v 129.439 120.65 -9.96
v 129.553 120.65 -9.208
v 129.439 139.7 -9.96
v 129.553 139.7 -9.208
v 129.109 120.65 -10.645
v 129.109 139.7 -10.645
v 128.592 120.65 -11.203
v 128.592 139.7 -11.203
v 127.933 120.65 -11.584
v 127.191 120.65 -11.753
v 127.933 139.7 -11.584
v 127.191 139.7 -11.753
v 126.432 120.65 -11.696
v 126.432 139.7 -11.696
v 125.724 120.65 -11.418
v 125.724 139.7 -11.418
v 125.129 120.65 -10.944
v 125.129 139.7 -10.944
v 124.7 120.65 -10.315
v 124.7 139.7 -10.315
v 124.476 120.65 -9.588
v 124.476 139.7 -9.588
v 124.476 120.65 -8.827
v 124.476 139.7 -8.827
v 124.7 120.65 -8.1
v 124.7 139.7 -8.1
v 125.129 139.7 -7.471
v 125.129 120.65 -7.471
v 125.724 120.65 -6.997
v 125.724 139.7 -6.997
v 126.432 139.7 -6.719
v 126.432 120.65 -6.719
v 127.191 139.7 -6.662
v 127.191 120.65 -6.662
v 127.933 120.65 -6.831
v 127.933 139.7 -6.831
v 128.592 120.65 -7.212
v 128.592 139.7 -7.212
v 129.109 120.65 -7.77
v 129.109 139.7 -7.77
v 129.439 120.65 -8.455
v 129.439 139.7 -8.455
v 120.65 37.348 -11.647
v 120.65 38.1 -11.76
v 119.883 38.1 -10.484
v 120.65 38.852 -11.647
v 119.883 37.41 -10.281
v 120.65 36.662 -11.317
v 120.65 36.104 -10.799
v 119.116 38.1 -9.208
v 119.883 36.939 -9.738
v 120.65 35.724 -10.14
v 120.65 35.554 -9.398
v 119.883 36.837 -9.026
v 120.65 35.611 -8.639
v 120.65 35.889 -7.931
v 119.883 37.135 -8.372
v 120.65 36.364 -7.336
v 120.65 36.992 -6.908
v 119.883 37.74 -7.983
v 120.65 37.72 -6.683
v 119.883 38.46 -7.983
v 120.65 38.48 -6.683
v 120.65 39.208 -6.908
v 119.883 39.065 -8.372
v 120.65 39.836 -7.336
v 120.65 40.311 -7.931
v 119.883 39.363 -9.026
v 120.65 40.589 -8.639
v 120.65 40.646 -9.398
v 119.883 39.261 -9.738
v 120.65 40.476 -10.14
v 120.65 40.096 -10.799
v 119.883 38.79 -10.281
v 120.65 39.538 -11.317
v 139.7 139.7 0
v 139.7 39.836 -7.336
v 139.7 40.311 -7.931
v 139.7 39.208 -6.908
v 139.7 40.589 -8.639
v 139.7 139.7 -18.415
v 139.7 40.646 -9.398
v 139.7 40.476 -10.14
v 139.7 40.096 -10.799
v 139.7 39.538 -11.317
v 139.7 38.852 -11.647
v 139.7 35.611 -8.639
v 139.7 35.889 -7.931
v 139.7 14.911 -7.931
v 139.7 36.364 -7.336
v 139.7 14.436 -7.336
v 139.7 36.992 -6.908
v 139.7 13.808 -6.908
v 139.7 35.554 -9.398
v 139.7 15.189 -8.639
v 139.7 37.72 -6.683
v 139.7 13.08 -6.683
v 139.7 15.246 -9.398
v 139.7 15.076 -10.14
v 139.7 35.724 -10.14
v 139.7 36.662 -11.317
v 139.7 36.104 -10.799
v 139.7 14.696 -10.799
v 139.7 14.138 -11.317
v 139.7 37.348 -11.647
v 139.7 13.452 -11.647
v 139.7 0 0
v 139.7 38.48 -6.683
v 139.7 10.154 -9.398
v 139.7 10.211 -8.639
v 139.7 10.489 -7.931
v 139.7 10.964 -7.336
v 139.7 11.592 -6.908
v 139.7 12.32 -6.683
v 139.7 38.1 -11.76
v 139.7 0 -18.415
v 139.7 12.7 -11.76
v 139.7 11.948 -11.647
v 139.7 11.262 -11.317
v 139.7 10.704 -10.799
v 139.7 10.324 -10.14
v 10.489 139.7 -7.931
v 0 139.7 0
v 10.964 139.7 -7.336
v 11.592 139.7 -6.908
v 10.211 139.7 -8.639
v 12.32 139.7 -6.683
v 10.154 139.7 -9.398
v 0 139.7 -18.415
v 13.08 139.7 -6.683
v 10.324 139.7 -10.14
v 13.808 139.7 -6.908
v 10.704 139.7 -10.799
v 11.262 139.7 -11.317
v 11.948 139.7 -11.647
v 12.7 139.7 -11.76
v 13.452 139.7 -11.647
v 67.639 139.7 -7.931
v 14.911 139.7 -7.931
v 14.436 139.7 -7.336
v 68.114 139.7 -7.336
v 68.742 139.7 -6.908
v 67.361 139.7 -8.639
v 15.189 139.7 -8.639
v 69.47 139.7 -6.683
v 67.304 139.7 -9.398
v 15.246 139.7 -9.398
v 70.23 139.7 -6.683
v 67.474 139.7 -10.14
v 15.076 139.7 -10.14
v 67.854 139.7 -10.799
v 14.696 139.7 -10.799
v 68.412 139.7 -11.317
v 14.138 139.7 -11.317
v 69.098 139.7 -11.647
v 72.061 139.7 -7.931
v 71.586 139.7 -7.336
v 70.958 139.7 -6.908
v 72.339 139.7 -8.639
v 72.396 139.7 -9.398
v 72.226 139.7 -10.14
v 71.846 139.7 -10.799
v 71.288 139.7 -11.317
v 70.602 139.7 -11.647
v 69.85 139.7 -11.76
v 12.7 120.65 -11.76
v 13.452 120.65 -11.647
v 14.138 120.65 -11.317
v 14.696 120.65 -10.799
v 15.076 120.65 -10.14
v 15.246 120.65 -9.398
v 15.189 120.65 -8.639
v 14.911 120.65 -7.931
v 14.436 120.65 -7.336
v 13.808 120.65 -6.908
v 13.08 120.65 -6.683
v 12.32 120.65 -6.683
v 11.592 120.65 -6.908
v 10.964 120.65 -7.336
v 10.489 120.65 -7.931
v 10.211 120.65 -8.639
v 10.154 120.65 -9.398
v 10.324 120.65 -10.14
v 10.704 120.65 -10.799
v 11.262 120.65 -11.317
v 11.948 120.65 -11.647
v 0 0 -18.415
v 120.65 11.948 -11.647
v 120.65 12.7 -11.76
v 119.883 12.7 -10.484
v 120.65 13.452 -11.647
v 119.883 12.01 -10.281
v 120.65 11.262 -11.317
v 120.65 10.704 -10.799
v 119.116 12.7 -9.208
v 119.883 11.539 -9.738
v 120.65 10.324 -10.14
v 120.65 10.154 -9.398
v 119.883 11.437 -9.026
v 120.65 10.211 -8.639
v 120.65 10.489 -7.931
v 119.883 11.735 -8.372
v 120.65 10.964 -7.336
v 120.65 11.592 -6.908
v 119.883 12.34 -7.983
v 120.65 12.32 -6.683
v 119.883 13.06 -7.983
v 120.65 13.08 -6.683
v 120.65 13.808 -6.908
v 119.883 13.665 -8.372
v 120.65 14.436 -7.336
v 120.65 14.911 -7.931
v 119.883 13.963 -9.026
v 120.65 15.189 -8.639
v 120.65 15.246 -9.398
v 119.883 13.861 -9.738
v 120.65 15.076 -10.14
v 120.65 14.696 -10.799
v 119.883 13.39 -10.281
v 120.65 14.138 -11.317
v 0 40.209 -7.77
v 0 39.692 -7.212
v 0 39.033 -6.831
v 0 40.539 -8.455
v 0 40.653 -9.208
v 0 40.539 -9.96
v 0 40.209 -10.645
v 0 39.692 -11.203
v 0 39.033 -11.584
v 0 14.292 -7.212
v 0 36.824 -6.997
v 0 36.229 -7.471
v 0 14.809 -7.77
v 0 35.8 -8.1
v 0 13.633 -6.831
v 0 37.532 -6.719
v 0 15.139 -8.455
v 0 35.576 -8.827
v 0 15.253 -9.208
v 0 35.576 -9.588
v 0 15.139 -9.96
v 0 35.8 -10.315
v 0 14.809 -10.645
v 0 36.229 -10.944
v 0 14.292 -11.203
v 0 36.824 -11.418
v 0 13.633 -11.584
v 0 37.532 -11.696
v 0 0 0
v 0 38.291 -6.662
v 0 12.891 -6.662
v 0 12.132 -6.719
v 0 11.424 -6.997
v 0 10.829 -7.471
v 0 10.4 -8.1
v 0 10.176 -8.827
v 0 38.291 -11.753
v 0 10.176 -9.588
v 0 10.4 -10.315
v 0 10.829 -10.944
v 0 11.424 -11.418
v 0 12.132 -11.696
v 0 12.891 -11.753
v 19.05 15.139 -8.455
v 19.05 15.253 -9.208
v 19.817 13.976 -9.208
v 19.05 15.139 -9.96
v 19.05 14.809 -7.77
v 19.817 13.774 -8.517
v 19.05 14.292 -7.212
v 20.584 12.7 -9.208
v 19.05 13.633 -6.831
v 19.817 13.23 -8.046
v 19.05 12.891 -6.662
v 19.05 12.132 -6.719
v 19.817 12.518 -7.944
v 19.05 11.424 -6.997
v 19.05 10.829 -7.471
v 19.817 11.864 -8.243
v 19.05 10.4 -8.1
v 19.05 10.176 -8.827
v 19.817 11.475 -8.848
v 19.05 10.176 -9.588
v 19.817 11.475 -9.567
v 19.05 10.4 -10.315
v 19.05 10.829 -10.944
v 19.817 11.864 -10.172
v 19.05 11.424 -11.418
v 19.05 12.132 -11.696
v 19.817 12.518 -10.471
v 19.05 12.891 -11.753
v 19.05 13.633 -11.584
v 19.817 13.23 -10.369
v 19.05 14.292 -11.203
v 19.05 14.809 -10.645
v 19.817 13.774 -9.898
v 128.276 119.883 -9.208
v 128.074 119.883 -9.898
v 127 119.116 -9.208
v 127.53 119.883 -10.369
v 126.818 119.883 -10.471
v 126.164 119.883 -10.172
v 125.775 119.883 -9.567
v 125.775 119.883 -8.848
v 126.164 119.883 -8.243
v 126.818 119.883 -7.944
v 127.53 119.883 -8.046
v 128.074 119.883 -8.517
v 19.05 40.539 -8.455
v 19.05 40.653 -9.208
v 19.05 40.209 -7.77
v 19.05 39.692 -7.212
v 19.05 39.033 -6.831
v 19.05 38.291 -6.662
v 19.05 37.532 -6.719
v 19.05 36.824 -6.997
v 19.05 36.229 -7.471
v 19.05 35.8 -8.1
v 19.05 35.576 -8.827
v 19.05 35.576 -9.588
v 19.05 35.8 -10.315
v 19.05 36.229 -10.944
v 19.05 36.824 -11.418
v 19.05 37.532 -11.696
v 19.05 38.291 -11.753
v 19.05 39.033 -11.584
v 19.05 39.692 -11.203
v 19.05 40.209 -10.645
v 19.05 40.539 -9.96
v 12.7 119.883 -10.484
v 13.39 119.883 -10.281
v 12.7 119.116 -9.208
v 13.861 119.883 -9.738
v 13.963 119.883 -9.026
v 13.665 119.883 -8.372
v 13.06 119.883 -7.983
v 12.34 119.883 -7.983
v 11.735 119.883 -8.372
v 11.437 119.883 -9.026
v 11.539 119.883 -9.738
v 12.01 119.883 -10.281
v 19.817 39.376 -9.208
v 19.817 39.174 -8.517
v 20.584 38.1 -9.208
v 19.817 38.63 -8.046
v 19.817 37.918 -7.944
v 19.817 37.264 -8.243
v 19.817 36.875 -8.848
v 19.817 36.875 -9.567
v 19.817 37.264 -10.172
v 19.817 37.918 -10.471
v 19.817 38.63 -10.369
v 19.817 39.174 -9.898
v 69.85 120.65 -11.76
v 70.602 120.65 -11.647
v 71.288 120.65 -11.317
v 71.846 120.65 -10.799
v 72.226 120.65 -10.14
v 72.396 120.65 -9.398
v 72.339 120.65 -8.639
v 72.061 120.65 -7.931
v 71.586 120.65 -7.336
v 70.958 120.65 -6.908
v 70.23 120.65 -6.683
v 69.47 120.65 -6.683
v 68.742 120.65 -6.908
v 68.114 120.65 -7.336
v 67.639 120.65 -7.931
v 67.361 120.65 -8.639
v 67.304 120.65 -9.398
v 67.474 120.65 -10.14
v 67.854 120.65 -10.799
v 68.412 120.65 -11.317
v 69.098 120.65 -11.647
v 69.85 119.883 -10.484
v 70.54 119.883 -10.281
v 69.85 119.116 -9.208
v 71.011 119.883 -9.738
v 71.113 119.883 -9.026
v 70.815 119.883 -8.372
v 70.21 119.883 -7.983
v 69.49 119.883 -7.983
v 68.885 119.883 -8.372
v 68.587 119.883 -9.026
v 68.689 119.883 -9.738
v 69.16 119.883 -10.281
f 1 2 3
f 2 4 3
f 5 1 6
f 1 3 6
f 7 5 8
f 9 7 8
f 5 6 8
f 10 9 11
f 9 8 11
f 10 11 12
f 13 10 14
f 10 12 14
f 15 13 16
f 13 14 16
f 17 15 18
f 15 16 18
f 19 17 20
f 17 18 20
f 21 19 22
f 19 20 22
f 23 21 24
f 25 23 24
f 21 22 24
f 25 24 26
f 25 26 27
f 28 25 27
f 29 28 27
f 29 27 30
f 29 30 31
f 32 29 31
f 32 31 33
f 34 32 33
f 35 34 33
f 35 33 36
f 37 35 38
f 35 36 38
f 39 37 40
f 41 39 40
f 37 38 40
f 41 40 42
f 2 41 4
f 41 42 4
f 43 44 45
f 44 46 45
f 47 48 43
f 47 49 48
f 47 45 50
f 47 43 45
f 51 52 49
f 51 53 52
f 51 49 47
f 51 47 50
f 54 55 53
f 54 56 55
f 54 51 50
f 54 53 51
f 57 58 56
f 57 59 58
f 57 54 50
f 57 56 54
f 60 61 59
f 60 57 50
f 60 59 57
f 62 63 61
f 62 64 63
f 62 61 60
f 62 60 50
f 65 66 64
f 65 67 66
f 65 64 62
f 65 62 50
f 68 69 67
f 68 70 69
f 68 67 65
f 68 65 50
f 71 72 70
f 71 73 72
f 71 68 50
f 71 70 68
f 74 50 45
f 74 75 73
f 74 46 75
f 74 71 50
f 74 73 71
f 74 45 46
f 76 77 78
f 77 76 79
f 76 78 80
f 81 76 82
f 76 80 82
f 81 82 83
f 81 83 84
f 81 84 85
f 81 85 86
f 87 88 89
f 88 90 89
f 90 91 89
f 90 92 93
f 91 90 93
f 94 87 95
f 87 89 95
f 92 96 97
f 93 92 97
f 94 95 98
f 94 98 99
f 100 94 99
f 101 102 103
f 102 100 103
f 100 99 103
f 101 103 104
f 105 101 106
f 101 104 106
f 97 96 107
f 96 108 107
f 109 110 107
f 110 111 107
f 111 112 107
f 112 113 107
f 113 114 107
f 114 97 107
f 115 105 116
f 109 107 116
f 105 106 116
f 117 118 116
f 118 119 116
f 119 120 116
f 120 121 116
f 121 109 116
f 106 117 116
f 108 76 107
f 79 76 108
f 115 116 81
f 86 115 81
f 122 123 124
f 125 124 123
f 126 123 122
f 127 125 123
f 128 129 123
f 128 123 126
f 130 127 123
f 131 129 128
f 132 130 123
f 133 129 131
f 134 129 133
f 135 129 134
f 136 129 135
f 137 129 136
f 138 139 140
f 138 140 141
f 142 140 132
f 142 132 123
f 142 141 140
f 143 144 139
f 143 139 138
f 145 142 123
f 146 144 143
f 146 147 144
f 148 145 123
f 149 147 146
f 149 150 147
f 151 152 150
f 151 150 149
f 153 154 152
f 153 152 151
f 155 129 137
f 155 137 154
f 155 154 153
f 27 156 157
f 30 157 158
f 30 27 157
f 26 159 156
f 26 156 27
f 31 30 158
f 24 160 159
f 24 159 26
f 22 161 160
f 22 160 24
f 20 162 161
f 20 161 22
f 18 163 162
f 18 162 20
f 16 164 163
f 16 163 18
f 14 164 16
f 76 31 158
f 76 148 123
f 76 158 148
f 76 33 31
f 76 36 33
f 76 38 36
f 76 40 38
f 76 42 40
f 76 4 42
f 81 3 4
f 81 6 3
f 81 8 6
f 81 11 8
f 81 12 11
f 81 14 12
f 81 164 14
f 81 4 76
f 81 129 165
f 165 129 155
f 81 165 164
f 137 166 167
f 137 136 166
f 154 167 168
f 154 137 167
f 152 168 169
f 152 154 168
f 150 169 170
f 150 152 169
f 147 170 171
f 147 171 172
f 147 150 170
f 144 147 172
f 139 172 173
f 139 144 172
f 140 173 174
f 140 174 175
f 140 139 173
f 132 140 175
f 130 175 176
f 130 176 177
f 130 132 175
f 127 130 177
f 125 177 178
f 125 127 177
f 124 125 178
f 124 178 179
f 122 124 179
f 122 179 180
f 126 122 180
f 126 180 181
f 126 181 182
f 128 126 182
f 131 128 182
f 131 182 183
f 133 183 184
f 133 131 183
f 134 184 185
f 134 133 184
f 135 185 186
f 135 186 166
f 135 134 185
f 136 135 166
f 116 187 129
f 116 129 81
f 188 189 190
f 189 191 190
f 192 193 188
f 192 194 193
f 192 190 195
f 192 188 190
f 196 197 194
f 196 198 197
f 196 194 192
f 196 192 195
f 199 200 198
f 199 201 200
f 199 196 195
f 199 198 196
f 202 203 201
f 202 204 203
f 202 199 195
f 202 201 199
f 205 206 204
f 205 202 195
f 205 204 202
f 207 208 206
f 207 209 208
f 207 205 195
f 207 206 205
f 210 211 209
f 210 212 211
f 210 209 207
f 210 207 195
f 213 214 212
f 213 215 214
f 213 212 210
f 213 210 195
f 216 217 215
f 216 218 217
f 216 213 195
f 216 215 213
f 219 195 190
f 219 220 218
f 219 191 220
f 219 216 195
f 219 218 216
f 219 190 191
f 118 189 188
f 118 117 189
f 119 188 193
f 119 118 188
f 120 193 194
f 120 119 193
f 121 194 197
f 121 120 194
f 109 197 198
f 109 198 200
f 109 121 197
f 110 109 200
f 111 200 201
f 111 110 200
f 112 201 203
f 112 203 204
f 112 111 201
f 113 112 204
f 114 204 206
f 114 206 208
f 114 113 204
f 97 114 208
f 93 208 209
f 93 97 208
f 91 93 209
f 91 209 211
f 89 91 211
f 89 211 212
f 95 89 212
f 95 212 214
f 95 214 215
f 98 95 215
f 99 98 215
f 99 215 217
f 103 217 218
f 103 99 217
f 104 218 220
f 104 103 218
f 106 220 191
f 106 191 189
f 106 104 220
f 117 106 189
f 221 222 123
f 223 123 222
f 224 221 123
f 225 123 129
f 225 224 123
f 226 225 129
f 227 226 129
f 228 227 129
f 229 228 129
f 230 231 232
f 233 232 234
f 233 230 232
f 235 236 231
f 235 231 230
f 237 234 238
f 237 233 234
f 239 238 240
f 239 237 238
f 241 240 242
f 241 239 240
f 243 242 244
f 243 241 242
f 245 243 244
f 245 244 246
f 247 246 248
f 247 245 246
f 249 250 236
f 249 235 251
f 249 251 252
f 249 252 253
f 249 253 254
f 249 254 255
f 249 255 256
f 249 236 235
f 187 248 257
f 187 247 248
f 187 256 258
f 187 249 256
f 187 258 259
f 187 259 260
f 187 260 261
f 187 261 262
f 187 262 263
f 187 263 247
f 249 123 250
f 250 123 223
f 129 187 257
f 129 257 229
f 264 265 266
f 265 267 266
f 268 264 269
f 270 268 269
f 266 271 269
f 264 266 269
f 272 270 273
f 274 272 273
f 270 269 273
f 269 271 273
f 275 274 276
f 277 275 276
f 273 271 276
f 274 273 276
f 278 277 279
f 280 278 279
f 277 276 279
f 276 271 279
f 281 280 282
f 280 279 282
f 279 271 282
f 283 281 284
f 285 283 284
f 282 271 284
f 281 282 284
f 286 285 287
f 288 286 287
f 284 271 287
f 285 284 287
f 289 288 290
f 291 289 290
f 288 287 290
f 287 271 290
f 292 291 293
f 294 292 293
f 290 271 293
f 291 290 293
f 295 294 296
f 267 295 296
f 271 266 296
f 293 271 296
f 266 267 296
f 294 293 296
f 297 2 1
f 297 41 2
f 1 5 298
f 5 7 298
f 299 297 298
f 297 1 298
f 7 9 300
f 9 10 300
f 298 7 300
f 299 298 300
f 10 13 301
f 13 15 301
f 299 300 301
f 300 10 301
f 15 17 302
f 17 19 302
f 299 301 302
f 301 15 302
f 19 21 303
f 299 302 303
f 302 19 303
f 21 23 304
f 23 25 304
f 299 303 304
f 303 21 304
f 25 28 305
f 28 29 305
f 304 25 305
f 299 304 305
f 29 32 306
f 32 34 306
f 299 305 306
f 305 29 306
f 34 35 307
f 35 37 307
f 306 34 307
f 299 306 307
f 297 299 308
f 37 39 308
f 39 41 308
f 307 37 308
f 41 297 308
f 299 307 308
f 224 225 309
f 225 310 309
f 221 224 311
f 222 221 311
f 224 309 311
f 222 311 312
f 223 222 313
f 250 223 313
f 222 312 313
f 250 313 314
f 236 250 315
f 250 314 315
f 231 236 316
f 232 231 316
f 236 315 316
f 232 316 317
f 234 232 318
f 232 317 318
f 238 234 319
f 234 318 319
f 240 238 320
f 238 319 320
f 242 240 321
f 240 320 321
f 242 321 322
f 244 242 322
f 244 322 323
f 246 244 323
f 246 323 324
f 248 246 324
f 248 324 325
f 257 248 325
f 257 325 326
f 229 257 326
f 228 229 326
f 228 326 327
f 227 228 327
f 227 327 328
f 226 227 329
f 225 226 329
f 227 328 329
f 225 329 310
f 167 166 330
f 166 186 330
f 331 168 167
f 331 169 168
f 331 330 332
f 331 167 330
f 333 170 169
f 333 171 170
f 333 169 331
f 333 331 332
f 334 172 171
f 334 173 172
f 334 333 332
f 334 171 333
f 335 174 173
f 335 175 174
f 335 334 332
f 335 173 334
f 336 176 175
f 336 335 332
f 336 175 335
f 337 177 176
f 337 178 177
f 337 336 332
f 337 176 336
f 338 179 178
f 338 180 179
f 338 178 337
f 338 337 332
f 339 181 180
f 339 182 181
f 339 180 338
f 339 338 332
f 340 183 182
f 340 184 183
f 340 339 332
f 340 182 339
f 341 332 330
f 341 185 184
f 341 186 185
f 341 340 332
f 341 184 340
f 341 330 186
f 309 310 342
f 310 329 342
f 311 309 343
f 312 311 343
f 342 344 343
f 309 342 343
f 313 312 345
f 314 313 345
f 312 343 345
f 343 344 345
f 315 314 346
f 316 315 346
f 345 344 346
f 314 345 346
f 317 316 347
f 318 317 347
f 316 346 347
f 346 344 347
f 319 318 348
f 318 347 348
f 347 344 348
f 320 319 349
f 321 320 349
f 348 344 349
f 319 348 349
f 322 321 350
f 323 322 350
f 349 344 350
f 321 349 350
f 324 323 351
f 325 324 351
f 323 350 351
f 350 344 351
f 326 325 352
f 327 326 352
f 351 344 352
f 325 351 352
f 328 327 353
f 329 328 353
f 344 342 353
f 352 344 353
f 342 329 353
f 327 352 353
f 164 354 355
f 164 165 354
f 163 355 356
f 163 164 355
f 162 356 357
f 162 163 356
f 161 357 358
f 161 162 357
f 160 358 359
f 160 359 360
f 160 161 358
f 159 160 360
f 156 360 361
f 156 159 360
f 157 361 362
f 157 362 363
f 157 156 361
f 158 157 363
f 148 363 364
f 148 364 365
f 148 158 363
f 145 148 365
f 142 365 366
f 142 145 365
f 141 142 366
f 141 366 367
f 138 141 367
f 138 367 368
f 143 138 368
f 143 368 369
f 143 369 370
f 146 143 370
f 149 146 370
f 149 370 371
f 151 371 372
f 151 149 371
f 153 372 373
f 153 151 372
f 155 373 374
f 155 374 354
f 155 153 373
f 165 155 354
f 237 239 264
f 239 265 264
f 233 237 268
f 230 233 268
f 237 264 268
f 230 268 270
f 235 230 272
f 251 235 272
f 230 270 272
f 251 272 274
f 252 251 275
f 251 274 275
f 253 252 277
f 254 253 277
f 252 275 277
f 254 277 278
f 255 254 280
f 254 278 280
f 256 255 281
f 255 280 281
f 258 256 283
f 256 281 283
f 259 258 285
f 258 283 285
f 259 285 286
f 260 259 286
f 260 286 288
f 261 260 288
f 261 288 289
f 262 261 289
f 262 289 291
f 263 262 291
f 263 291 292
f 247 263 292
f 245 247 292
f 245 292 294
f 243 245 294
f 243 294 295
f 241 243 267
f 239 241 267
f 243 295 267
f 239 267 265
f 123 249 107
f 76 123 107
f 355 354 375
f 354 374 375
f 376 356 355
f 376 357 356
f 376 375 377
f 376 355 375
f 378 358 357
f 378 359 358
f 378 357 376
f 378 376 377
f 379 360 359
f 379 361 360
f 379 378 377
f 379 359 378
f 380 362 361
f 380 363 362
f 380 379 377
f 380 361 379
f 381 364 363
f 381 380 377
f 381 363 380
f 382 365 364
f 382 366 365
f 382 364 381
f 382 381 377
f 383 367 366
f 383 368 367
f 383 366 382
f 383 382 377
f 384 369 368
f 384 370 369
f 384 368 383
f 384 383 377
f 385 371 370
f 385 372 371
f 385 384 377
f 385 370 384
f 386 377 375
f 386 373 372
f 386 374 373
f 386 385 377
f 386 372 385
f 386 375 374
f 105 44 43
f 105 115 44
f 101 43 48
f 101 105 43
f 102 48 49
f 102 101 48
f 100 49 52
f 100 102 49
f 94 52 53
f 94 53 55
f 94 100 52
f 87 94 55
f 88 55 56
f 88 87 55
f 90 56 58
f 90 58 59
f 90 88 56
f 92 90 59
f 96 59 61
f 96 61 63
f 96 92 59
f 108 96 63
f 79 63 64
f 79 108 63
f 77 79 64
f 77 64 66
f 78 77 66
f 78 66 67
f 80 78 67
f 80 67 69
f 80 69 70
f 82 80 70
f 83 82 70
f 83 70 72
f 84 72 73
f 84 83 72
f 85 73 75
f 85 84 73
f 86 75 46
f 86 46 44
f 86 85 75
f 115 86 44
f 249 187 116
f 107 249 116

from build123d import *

# Parameters (mm, degrees)
SKETCH1_W           = 139.7
SKETCH1_H           = 18.415
BOSS_EXTRUDE1_DEPTH = 139.7


# Read off the part's stored shape, not the designer's step: Mirror2
with BuildPart() as part:
    # Sketch1 → Boss-Extrude1 (new body)
    with BuildSketch(Plane(origin=(0, 0, 0), x_dir=(1, 0, 0), z_dir=(0, 1, 0))):
        with Locations((69.85, 9.2075)):
            Rectangle(SKETCH1_W, SKETCH1_H)
    extrude(amount=BOSS_EXTRUDE1_DEPTH)

    # Sketch4 → 1/4-20 Tapped Hole1 (revolve, cut)
    with BuildSketch(Plane(origin=(139.7, 38.1, -9.2075), x_dir=(0, 0, -1), z_dir=(0, 1, 0))):
        Polygon((0, 0), (0, 20.583816902), (2.5527, 19.05), (2.5527, 0), align=None)
    revolve(axis=Axis((146.05, 38.1, -9.2075), (-1, 0, 0)), mode=Mode.SUBTRACT)

    # Sketch4 at point 2 (carried to point 2, square into its face) → 1/4-20 Tapped Hole1 at 2 (revolve, cut)
    with BuildSketch(Plane(origin=(139.7, 12.7, -9.2075), x_dir=(0, 0, -1), z_dir=(0, 1, 0))):
        Polygon((0, 0), (0, 20.583816902), (2.5527, 19.05), (2.5527, 0), align=None)
    revolve(axis=Axis((146.05, 12.7, -9.2075), (-1, 0, 0)), mode=Mode.SUBTRACT)

    # Sketch4 at point 3 (carried to point 3, square into its face) → 1/4-20 Tapped Hole1 at 3 (revolve, cut)
    with BuildSketch(Plane(origin=(69.85, 139.7, -9.2075), x_dir=(0, 0, -1), z_dir=(-1, 0, 0))):
        Polygon((0, 0), (0, 20.583816902), (2.5527, 19.05), (2.5527, 0), align=None)
    revolve(axis=Axis((69.85, 146.05, -9.2075), (0, -1, 0)), mode=Mode.SUBTRACT)

    # Sketch4 at point 4 (carried to point 4, square into its face) → 1/4-20 Tapped Hole1 at 4 (revolve, cut)
    with BuildSketch(Plane(origin=(12.7, 139.7, -9.2075), x_dir=(0, 0, -1), z_dir=(-1, 0, 0))):
        Polygon((0, 0), (0, 20.583816902), (2.5527, 19.05), (2.5527, 0), align=None)
    revolve(axis=Axis((12.7, 146.05, -9.2075), (0, -1, 0)), mode=Mode.SUBTRACT)

    # Mirror2 outline → Mirror2 (revolve, cut)
    with BuildSketch(Plane(origin=(0, 12.7, -9.2075), x_dir=(0, 1, 0), z_dir=(0, 0, -1))):
        Polygon((2.5527, 0), (2.5527, 19.05), (0, 20.583816902), (0, 0), align=None)
    revolve(axis=Axis((0, 12.7, -9.2075), (1, 0, 0)), mode=Mode.SUBTRACT)

    # Mirror2 2 outline → Mirror2 2 (revolve, cut)
    with BuildSketch(Plane(origin=(0, 38.1, -9.2075), x_dir=(0, 1, 0), z_dir=(0, 0, -1))):
        Polygon((2.5527, 0), (2.5527, 19.05), (0, 20.583816902), (0, 0), align=None)
    revolve(axis=Axis((0, 38.1, -9.2075), (1, 0, 0)), mode=Mode.SUBTRACT)

    # Mirror2 3 outline → Mirror2 3 (revolve, cut)
    with BuildSketch(Plane(origin=(127, 0, -9.2075), x_dir=(1, 0, 0), z_dir=(0, 0, 1))):
        Polygon((0, 139.7), (0, 119.116183098), (2.5527, 120.65), (2.5527, 139.7), align=None)
    revolve(axis=Axis((127, 0, -9.2075), (0, 1, 0)), mode=Mode.SUBTRACT)


solid = part.part
